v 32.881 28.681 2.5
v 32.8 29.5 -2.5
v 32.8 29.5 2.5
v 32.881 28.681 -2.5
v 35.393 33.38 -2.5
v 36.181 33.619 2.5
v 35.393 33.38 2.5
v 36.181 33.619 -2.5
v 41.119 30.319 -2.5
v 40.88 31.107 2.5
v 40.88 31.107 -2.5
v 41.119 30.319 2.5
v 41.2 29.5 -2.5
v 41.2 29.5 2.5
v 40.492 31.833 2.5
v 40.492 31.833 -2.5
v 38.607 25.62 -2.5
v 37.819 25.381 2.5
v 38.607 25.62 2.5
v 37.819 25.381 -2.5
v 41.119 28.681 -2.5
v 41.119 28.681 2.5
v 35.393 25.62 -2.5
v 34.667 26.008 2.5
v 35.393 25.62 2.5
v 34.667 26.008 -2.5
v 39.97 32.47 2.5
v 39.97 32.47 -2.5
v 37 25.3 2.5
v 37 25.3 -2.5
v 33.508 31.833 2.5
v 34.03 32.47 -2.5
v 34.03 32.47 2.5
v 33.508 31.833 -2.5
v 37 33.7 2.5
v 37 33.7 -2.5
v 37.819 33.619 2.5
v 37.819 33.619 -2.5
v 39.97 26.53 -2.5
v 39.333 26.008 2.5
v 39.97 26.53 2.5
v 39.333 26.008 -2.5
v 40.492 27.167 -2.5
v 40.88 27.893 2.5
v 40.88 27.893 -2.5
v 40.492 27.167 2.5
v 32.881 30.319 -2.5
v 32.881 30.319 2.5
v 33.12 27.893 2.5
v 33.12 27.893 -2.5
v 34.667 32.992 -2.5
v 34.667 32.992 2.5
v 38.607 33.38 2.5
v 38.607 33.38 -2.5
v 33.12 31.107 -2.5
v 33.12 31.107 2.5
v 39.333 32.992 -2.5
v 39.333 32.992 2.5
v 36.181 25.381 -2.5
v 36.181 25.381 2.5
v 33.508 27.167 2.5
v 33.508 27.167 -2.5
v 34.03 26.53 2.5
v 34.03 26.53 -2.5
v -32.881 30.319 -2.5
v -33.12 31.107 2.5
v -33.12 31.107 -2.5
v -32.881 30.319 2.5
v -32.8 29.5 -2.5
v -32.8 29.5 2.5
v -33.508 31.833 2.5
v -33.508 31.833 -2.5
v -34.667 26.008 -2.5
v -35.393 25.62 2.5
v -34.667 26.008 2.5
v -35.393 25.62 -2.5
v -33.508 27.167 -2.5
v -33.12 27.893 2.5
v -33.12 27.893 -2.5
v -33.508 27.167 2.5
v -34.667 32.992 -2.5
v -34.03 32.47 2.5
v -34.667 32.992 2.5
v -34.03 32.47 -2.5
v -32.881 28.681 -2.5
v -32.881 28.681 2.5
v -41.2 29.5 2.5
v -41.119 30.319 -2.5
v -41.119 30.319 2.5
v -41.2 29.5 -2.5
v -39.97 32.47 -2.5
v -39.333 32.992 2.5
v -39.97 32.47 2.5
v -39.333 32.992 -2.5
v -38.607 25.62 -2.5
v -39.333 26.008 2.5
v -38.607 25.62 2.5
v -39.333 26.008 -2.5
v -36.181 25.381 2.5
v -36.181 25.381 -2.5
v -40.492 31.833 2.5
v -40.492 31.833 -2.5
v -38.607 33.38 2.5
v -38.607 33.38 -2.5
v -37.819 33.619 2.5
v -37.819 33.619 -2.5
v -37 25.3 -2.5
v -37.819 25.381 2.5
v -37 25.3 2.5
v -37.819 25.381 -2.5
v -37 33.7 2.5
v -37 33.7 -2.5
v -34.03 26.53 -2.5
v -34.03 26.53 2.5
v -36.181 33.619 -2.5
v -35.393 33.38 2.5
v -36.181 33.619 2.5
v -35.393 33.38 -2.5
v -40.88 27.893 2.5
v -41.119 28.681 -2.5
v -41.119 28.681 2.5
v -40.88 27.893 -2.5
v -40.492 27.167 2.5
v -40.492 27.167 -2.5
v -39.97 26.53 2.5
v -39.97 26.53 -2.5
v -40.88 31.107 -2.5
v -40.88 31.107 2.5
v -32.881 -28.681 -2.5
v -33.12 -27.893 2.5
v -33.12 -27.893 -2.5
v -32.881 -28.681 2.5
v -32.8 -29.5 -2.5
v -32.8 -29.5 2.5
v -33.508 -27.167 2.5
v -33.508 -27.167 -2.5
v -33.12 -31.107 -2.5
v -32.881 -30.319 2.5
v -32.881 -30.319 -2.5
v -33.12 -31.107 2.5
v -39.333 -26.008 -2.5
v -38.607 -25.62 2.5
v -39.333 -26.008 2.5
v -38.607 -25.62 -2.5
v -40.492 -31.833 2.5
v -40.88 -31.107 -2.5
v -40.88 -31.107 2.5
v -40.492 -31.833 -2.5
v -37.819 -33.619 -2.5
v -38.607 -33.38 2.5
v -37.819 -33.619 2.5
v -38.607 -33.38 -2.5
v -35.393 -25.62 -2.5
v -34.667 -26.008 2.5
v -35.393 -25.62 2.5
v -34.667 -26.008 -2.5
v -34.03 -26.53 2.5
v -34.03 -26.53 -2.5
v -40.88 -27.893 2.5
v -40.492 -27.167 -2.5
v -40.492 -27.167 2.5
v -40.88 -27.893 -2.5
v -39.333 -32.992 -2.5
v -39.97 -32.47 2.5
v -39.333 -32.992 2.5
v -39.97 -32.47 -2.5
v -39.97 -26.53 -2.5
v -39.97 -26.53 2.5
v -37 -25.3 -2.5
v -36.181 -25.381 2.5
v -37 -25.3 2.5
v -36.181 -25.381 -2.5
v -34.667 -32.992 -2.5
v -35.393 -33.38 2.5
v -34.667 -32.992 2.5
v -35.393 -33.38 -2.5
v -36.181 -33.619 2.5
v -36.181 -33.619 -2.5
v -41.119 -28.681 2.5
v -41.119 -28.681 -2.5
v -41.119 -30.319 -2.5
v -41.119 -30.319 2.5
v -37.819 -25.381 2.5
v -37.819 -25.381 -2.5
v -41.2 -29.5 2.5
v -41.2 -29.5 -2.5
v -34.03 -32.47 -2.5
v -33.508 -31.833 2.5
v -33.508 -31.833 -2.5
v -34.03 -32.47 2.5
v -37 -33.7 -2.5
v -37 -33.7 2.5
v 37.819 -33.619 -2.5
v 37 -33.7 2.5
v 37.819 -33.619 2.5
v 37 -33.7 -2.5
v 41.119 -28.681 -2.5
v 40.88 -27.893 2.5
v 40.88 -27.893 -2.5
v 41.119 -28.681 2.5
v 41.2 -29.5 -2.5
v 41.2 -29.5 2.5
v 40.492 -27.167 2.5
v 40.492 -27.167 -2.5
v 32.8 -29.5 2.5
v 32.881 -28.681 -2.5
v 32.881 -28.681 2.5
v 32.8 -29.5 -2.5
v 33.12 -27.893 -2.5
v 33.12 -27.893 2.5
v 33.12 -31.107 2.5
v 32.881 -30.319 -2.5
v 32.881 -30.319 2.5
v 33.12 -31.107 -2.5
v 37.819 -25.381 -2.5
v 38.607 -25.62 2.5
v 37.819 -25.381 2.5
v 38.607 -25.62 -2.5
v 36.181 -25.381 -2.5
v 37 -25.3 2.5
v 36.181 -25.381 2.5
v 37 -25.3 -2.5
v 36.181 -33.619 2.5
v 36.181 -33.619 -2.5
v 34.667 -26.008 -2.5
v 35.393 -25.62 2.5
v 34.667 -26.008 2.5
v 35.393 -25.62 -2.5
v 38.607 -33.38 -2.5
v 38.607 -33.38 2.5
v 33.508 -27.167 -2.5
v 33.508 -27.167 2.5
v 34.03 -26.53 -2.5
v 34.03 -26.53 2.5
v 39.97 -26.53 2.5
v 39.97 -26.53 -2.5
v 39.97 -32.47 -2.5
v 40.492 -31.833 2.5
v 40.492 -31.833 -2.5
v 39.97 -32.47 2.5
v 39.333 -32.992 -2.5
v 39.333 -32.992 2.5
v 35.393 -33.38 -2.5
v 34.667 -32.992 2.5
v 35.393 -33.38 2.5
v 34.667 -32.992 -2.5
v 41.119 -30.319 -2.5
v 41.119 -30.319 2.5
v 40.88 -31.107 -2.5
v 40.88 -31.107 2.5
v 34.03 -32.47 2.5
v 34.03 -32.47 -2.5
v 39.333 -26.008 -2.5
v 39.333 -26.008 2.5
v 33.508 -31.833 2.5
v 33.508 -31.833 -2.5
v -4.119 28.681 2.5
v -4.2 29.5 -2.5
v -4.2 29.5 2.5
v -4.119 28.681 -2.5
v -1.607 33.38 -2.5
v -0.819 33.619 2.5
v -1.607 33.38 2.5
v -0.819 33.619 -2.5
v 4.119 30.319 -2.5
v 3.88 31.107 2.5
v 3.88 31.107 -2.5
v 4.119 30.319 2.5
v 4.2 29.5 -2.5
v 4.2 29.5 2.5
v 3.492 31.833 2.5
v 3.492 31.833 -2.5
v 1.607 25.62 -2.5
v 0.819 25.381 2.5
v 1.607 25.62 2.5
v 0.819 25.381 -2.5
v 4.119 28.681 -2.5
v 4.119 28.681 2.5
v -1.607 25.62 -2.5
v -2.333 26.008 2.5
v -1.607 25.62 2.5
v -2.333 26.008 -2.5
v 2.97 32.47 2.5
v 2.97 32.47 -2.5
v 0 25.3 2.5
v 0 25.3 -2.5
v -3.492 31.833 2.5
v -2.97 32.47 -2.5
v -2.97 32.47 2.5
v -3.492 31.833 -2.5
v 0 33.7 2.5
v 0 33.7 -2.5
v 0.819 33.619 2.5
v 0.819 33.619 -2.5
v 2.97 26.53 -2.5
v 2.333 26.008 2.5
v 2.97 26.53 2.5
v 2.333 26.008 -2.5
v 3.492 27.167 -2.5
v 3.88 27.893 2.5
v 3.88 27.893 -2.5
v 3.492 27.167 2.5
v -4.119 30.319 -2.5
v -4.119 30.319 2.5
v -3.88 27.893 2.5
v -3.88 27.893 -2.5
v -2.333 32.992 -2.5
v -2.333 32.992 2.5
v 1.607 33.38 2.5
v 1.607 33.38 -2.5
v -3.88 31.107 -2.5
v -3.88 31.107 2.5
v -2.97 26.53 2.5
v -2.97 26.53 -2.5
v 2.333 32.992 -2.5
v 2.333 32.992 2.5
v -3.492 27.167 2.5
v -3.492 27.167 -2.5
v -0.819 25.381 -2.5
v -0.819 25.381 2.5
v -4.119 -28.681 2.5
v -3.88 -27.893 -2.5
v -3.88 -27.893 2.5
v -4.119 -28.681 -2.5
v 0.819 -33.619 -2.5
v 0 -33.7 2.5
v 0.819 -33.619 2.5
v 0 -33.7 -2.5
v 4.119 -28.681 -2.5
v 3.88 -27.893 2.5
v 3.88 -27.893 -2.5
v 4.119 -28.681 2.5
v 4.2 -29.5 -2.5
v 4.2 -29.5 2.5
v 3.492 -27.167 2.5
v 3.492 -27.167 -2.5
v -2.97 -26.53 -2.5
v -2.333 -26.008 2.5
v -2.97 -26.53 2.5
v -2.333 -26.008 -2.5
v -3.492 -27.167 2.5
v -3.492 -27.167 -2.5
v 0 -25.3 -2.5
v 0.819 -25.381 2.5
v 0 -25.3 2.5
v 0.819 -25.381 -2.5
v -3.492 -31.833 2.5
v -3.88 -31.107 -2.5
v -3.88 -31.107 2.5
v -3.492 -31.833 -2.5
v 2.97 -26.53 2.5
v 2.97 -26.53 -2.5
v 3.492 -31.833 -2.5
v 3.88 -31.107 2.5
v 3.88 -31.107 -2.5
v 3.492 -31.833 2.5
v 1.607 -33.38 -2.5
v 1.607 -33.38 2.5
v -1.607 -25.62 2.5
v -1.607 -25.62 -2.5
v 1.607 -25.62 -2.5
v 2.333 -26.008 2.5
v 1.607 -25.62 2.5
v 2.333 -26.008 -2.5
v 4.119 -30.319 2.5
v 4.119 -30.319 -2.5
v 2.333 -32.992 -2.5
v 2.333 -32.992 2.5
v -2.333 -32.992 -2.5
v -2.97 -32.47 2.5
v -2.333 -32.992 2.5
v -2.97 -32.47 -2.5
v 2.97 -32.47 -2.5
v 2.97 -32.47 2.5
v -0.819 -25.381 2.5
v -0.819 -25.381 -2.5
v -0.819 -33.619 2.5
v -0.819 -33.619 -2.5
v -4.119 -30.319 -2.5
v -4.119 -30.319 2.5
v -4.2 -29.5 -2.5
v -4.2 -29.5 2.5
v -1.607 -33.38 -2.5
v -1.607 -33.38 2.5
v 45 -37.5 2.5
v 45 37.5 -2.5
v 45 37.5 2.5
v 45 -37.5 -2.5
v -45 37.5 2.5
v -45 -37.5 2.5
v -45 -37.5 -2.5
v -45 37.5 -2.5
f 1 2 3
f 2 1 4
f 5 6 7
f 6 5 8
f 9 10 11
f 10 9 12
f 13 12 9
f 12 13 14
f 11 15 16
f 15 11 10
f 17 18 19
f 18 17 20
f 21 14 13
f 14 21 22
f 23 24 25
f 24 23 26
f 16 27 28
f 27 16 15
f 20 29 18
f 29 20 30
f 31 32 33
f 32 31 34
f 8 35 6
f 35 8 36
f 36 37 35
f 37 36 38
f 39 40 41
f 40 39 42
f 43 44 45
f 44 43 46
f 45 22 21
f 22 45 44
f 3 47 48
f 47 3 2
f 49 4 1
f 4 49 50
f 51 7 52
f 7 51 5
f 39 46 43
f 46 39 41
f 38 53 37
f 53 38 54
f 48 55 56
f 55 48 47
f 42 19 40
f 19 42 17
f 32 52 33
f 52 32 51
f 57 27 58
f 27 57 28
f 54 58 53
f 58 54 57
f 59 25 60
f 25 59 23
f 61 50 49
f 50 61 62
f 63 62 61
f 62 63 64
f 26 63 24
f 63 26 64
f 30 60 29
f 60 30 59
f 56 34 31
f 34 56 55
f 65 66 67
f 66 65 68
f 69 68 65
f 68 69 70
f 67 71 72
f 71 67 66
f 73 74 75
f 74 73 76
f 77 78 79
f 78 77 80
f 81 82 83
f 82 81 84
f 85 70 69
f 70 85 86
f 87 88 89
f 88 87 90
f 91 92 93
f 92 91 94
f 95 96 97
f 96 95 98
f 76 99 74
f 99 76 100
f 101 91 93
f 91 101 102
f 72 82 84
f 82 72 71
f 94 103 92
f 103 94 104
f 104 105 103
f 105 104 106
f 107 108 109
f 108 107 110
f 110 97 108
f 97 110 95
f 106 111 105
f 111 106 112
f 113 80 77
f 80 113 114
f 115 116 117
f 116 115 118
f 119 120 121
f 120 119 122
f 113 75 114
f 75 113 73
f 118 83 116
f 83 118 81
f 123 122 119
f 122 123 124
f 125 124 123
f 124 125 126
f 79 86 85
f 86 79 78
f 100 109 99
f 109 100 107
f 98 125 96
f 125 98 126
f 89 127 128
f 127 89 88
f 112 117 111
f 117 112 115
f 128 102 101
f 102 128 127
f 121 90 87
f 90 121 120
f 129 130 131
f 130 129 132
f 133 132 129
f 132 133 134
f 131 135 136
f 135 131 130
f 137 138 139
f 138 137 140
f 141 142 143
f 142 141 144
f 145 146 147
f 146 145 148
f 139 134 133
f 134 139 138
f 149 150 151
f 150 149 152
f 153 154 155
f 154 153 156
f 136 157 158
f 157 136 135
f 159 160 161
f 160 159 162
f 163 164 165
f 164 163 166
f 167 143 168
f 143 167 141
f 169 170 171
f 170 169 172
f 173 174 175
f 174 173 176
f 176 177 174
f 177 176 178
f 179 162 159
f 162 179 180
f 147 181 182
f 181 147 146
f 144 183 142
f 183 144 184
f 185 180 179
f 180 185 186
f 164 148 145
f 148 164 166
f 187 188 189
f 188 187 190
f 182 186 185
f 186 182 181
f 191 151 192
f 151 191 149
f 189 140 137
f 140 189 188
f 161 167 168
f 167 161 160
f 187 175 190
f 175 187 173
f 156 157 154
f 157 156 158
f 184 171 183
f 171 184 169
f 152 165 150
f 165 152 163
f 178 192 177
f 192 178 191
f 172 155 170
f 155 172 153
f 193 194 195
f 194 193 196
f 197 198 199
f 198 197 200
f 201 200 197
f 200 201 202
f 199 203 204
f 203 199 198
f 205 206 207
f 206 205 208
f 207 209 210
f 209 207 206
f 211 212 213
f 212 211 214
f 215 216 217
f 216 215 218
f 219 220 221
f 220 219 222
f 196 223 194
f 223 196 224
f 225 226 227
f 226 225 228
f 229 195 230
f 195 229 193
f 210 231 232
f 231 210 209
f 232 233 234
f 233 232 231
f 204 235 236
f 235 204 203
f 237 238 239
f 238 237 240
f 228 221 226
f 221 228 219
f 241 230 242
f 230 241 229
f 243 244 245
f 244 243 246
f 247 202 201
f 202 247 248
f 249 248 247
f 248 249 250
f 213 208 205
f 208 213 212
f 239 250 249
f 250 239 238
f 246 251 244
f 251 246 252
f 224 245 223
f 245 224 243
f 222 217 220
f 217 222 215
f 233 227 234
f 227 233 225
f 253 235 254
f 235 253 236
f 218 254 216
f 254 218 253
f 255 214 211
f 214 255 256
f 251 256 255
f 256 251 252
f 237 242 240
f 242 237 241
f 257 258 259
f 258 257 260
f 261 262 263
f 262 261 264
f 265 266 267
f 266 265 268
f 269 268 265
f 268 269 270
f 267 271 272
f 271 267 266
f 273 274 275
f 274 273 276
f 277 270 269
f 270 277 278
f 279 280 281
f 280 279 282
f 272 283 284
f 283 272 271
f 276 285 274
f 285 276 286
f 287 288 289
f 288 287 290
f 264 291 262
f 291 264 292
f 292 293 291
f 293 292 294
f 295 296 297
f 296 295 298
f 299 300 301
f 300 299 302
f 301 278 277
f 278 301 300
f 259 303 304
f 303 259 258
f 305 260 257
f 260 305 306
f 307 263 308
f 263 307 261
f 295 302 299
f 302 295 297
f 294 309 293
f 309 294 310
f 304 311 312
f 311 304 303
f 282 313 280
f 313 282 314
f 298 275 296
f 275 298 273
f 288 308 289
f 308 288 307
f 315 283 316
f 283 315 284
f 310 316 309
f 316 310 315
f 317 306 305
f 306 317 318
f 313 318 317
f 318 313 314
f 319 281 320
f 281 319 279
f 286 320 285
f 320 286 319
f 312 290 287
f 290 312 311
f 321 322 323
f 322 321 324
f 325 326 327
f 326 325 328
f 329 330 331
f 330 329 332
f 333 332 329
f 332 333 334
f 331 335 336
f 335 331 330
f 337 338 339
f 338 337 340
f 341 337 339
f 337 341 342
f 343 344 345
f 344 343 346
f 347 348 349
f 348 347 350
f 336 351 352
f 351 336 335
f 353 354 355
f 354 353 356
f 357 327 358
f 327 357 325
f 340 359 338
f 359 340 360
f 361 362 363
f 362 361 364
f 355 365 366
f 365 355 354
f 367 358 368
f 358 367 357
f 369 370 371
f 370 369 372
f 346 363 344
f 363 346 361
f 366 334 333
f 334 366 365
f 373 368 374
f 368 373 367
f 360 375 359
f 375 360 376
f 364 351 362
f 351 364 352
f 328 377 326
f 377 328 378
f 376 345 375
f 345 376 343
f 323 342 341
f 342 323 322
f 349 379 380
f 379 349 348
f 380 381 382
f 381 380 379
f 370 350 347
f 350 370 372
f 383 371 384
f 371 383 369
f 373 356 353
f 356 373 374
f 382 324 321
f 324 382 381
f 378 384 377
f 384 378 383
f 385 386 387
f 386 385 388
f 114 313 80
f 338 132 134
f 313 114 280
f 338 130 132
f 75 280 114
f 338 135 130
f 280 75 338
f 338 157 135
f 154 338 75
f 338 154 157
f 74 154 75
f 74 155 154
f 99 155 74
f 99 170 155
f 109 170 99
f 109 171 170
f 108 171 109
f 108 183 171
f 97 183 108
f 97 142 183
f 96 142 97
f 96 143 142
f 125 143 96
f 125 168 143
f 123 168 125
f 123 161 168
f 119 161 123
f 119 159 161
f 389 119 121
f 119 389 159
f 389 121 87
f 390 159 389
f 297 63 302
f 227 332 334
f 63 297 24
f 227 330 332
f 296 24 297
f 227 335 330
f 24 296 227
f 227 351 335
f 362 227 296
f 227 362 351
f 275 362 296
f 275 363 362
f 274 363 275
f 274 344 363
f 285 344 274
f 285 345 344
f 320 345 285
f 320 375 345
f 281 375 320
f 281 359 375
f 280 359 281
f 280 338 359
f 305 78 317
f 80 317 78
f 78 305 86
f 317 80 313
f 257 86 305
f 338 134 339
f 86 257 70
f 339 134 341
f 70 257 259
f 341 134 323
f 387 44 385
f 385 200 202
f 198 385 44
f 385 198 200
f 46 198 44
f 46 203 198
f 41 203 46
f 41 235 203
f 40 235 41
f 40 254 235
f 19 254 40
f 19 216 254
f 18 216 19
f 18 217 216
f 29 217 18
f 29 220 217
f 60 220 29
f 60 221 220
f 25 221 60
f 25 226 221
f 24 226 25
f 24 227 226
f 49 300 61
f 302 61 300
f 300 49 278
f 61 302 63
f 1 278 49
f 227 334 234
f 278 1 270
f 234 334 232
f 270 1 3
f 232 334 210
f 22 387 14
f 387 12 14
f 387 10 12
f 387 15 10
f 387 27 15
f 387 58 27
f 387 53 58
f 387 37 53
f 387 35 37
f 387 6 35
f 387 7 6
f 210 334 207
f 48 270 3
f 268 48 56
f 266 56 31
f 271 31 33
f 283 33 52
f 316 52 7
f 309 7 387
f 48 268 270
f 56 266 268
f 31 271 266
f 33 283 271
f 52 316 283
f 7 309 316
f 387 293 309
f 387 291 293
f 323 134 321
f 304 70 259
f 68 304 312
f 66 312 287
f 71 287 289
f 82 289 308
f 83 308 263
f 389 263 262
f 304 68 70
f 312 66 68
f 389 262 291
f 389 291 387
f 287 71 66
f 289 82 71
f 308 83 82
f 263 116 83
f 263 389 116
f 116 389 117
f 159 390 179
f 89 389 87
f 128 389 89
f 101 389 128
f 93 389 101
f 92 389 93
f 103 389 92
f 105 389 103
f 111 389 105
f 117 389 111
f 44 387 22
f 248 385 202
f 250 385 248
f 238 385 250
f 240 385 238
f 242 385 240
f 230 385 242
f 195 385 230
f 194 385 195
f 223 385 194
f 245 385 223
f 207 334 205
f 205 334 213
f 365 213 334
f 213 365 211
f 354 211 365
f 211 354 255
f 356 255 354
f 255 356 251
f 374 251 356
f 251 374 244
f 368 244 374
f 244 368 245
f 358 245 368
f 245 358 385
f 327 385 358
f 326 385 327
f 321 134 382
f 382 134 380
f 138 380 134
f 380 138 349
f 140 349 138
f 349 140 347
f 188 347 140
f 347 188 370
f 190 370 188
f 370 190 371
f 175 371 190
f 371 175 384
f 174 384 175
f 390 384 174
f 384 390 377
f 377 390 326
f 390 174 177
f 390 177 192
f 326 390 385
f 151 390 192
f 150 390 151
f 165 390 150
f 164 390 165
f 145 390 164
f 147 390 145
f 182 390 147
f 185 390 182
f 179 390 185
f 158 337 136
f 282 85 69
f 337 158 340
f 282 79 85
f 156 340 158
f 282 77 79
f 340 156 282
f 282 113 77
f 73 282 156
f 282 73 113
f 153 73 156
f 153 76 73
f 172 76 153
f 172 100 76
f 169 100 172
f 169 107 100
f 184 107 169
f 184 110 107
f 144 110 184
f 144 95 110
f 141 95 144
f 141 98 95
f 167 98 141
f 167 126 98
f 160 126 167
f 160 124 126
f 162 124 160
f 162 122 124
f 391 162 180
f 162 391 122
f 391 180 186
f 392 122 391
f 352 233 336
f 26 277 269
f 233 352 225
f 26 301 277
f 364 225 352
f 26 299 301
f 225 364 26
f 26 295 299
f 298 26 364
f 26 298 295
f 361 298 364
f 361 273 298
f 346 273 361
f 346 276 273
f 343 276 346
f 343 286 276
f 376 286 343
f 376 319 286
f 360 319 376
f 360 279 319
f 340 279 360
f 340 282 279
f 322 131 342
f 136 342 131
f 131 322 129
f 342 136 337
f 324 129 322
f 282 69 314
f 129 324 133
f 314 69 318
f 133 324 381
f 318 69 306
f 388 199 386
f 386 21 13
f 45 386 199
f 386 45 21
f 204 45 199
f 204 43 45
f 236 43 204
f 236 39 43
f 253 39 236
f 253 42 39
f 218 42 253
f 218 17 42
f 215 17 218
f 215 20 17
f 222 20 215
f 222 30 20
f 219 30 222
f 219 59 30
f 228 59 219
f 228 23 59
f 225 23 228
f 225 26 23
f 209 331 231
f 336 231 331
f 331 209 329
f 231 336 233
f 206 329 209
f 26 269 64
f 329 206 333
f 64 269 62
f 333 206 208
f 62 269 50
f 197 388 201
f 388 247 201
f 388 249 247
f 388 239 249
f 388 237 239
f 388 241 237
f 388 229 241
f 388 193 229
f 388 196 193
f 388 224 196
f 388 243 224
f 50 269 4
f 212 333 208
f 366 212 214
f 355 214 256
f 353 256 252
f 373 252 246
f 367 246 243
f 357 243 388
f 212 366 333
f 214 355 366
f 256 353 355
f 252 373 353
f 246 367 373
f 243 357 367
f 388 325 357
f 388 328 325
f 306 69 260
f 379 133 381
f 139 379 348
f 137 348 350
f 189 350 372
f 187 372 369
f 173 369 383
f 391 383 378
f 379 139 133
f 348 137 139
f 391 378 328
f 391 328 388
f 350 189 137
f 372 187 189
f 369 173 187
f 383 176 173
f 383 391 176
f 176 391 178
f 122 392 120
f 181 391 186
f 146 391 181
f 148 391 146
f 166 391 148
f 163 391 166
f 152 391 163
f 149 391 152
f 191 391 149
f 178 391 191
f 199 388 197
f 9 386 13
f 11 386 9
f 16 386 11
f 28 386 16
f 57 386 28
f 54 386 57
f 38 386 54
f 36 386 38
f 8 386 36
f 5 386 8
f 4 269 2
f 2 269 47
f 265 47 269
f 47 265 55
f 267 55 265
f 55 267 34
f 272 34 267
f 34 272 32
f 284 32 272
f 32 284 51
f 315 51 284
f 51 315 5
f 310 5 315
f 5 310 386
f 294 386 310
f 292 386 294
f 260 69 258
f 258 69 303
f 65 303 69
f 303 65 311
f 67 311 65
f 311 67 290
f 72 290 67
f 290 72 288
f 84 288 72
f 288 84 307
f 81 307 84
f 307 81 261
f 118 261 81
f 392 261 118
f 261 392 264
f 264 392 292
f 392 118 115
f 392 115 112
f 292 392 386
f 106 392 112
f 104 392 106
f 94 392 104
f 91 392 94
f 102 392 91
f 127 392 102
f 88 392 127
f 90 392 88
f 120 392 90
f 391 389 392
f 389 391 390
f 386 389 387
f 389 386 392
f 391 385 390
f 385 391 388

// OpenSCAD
$fn = 32;

// ----------------------------------------------------------------------
// Corner plate 90 x 75 x 5
// 6 holes, centres taken from the edge offset
// ----------------------------------------------------------------------

// --- parameters (mm) ---
plate = [90, 75, 5];  // overall size (x, y, z)
holes = 6;            // number of holes the drawing asks for
hole_d = 8.4;         // hole diameter
edge = 8;             // hole centre offset from the plate edge

// --- derived feature positions (mm) ---
corner_x = plate[0] / 2 - edge;  // = 37   corner hole X
corner_y = plate[1] / 2 - edge;  // = 29.5   corner hole Y
feature_centers = [
  [corner_x, corner_y],
  [-corner_x, corner_y],
  [-corner_x, -corner_y],
  [corner_x, -corner_y],
  [0, corner_y],
  [0, -corner_y]
];   // hole centres the loop below drills

// plate outline, every hole drilled through with the same cutters
difference() {
  cube(plate, center = true);
  for (centre = feature_centers)
    translate([centre[0], centre[1], 0])
      cylinder(d = hole_d, h = plate[2] + 2, center = true);
}
